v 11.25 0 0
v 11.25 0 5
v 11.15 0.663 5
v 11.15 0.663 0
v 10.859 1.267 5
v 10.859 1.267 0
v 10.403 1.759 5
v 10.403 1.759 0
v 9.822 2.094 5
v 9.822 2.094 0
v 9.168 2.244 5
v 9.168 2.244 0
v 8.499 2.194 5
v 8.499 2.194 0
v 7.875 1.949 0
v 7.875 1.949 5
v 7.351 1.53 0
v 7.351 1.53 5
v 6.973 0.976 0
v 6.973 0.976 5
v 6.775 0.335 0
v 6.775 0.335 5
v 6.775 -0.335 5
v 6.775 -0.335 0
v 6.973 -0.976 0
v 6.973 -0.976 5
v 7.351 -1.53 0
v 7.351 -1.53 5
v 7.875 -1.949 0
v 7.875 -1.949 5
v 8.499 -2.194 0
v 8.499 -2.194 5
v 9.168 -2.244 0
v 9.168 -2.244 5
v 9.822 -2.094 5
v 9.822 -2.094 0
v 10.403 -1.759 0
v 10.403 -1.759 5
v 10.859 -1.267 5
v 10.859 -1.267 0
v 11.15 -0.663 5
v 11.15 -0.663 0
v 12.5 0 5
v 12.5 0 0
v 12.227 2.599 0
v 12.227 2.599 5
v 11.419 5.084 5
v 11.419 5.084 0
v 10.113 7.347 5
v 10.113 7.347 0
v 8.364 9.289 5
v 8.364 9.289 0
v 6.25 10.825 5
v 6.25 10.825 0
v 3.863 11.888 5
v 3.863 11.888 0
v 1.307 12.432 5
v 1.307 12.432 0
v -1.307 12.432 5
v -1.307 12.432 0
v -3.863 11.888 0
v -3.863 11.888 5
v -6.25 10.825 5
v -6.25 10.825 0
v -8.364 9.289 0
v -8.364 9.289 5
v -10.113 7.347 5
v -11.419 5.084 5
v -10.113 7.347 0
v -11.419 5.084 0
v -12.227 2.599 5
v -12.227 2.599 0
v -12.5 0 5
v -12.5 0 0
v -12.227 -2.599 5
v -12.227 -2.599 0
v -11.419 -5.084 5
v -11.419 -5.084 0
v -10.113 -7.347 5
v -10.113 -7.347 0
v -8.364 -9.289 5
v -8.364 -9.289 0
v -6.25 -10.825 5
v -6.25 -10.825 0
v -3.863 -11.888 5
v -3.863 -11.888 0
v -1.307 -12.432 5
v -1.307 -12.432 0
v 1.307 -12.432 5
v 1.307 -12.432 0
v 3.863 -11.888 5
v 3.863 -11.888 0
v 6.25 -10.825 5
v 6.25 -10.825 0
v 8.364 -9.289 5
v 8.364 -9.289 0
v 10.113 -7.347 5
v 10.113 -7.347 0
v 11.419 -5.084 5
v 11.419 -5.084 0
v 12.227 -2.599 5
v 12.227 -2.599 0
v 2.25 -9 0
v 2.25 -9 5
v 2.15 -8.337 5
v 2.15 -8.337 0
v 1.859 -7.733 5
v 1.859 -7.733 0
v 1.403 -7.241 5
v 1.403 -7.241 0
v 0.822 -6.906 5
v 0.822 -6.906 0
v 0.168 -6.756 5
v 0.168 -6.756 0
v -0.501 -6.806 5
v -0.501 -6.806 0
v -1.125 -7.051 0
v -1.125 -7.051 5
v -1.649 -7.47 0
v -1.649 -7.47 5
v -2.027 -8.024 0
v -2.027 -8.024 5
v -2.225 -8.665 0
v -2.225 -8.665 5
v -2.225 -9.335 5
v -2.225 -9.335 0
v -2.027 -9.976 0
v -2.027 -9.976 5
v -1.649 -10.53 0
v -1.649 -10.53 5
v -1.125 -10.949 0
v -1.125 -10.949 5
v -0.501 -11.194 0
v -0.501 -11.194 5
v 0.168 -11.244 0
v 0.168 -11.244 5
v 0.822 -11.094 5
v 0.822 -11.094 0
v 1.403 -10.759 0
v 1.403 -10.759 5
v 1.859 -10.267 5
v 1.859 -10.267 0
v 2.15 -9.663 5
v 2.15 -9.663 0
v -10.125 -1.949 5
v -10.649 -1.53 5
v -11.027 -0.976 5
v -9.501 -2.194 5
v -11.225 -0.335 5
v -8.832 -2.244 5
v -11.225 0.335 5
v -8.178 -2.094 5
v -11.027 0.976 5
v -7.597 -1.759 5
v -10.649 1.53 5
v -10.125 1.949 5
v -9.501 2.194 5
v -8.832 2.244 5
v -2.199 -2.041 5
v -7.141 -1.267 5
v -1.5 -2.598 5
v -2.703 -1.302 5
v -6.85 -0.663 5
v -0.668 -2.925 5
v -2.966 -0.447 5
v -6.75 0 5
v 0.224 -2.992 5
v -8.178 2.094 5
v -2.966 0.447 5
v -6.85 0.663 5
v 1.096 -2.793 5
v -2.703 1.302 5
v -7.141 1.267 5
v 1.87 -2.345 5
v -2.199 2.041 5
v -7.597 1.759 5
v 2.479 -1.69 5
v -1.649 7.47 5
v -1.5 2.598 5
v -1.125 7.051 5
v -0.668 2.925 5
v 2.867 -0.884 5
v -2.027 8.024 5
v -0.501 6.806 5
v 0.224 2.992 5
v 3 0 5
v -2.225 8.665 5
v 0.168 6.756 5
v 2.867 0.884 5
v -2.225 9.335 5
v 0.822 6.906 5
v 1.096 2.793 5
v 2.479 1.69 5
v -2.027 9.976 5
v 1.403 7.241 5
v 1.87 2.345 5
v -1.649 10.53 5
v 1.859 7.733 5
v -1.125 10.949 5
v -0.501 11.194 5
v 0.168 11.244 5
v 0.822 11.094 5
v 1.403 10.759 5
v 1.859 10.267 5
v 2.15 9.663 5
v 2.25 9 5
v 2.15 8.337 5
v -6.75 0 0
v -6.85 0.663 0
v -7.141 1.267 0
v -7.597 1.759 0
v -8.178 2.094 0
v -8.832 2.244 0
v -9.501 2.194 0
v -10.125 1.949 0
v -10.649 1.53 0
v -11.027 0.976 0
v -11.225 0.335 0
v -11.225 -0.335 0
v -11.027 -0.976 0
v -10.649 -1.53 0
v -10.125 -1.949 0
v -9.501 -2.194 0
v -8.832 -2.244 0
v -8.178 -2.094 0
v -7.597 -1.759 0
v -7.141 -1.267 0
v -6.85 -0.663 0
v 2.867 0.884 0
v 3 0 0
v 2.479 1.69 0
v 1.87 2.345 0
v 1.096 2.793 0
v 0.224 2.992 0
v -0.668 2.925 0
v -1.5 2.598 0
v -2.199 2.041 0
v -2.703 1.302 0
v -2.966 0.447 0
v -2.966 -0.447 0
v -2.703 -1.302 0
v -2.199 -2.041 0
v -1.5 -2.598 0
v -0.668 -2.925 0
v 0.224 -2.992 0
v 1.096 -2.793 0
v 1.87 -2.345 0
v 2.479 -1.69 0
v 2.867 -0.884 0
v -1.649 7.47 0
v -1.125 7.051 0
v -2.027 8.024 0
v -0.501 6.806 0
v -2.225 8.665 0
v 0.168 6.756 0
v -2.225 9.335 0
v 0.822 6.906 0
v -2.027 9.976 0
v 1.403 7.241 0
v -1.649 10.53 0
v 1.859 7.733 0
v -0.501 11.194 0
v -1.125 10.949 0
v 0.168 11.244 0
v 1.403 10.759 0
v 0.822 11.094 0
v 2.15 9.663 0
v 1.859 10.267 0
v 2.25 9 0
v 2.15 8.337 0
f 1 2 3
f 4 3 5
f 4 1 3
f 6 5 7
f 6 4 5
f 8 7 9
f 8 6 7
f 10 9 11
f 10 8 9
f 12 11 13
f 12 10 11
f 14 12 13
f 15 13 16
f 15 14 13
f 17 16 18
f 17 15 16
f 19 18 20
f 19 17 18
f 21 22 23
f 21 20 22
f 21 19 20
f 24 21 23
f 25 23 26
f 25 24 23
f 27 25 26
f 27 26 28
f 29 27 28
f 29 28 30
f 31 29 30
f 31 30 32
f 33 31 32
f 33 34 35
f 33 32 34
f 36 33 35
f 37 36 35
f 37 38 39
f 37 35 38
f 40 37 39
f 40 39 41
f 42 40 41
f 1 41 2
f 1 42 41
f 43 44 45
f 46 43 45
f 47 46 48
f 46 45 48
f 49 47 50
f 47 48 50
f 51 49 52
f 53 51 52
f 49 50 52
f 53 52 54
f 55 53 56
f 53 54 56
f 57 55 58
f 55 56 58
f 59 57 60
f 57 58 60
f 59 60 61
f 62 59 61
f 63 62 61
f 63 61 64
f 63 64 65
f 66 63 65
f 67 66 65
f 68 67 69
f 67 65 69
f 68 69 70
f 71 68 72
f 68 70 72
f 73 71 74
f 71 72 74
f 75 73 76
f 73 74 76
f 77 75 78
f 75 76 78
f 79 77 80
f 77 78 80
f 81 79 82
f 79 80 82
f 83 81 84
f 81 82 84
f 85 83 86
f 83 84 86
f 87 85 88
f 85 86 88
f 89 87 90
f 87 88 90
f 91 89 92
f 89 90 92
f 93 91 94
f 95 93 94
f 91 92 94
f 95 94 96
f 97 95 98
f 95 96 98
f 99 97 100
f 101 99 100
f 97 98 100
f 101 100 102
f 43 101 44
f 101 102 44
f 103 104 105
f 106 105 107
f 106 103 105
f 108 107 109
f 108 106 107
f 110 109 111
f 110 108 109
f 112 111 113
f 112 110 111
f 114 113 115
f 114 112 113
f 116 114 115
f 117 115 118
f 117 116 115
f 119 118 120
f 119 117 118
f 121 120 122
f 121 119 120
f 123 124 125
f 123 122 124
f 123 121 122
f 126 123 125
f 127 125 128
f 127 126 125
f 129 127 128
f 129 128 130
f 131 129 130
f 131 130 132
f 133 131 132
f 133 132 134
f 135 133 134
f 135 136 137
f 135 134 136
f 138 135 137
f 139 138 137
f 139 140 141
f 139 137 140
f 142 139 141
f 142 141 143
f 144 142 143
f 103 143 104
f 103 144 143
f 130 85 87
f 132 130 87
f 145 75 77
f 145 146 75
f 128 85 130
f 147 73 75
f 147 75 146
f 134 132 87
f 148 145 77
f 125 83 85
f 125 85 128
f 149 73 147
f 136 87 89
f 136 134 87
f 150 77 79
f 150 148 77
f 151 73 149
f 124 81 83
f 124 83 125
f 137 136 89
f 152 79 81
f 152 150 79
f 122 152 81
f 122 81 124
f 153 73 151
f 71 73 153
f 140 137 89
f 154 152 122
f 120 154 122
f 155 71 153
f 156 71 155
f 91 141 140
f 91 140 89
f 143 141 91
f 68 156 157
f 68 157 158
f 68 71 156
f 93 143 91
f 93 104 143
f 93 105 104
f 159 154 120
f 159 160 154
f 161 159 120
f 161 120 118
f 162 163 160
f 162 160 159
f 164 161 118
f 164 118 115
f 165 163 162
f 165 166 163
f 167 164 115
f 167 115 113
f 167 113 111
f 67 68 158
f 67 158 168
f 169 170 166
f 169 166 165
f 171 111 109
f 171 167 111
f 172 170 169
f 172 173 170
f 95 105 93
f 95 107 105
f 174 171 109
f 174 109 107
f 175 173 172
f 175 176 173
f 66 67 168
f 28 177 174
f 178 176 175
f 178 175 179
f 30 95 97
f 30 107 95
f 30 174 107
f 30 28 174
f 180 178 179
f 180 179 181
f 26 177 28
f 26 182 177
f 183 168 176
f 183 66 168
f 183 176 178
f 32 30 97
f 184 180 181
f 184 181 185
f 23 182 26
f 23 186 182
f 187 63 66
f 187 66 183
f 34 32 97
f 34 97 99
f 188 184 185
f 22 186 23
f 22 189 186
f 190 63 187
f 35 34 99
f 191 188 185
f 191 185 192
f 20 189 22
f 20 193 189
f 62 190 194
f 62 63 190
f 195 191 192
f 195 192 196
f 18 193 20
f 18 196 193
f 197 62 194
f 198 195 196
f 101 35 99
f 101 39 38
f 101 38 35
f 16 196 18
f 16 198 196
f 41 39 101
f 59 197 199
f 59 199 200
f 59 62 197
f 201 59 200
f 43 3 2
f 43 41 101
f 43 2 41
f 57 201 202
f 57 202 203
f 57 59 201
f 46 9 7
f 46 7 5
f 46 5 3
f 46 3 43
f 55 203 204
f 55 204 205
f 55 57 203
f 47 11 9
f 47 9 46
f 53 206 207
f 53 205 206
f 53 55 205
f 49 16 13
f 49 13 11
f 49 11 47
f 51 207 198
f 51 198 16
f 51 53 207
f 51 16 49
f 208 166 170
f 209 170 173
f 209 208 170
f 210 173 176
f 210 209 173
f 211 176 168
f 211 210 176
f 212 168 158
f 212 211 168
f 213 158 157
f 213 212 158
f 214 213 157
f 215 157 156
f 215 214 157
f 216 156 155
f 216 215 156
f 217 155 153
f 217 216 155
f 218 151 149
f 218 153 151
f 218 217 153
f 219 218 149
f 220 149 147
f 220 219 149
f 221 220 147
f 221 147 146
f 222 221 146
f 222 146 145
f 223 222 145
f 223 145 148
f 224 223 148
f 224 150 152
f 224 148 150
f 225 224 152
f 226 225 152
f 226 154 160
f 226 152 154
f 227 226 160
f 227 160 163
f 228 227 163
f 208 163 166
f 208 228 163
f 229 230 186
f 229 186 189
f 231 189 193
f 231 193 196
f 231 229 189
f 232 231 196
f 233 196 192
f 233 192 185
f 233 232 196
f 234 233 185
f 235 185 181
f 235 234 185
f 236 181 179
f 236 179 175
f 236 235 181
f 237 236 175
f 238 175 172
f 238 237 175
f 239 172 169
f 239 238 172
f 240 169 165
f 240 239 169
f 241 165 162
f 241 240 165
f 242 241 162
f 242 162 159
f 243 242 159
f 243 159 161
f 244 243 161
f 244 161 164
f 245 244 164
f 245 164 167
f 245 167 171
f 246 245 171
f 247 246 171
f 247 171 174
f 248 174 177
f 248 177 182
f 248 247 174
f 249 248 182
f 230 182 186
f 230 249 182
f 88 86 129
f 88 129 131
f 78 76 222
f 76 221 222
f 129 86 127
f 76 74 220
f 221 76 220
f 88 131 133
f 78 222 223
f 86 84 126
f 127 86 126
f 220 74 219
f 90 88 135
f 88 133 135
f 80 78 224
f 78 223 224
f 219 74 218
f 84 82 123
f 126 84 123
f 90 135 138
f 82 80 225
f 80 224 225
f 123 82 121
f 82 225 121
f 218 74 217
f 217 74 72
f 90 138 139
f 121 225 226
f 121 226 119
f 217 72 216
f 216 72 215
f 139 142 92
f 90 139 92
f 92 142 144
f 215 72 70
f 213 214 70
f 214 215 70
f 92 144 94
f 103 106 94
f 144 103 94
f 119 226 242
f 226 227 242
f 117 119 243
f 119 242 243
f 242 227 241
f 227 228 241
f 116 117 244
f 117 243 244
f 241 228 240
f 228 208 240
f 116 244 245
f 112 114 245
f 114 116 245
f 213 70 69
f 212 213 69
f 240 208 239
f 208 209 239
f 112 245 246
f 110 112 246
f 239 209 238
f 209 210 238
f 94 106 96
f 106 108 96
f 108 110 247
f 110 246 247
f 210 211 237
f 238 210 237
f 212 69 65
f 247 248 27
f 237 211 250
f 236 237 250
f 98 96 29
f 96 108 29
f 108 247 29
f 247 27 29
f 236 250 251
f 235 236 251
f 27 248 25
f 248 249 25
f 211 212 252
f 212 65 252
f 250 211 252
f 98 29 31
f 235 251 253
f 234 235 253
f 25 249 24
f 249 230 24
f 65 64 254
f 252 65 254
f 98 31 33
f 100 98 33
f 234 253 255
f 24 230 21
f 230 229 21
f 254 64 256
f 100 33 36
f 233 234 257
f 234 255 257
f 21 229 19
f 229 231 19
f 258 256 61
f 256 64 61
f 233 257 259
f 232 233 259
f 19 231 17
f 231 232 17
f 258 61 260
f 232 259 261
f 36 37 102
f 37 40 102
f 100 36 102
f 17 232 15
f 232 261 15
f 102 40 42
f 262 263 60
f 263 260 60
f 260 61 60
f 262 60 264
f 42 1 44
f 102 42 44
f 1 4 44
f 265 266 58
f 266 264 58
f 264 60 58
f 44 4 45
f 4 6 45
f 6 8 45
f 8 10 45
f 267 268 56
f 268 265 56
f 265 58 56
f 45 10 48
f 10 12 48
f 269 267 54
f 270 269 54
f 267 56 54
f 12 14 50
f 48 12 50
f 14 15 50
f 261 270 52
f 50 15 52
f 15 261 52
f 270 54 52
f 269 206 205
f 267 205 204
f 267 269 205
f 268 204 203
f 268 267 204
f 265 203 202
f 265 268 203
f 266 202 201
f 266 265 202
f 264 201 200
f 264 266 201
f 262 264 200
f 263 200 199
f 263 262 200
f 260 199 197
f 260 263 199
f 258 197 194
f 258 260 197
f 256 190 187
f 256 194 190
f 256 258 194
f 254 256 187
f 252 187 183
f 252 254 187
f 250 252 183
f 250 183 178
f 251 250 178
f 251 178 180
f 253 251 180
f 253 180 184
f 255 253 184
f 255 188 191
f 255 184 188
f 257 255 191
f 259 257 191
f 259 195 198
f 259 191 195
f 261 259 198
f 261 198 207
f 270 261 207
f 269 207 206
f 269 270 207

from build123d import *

# Parameters (mm, degrees)
F0_R     = 12.5
F0_R_2   = 3
F1_DEPTH = 5
F2_R     = 2.25
F3_DEPTH = 10
F4_R     = 2.25
F5_DEPTH = 10


with BuildPart() as f1:
    # F0 (on Top) → F1 (new body)
    with BuildSketch(Plane.XY):
        Circle(F0_R)
        Circle(F0_R_2, mode=Mode.SUBTRACT)
    extrude(amount=F1_DEPTH)

    # F2 (on Top) → F3 (cut)
    with BuildSketch(Plane.XY):
        with Locations((0, 9)):
            Circle(F2_R)
        with Locations((0, -9)):
            Circle(F2_R)
    extrude(amount=F3_DEPTH, mode=Mode.SUBTRACT)

    # F4 (on Top) → F5 (cut)
    with BuildSketch(Plane.XY):
        with Locations((-9, 0)):
            Circle(F4_R)
        with Locations((9, 0)):
            Circle(F4_R)
    extrude(amount=F5_DEPTH, mode=Mode.SUBTRACT)


solid = f1.part
